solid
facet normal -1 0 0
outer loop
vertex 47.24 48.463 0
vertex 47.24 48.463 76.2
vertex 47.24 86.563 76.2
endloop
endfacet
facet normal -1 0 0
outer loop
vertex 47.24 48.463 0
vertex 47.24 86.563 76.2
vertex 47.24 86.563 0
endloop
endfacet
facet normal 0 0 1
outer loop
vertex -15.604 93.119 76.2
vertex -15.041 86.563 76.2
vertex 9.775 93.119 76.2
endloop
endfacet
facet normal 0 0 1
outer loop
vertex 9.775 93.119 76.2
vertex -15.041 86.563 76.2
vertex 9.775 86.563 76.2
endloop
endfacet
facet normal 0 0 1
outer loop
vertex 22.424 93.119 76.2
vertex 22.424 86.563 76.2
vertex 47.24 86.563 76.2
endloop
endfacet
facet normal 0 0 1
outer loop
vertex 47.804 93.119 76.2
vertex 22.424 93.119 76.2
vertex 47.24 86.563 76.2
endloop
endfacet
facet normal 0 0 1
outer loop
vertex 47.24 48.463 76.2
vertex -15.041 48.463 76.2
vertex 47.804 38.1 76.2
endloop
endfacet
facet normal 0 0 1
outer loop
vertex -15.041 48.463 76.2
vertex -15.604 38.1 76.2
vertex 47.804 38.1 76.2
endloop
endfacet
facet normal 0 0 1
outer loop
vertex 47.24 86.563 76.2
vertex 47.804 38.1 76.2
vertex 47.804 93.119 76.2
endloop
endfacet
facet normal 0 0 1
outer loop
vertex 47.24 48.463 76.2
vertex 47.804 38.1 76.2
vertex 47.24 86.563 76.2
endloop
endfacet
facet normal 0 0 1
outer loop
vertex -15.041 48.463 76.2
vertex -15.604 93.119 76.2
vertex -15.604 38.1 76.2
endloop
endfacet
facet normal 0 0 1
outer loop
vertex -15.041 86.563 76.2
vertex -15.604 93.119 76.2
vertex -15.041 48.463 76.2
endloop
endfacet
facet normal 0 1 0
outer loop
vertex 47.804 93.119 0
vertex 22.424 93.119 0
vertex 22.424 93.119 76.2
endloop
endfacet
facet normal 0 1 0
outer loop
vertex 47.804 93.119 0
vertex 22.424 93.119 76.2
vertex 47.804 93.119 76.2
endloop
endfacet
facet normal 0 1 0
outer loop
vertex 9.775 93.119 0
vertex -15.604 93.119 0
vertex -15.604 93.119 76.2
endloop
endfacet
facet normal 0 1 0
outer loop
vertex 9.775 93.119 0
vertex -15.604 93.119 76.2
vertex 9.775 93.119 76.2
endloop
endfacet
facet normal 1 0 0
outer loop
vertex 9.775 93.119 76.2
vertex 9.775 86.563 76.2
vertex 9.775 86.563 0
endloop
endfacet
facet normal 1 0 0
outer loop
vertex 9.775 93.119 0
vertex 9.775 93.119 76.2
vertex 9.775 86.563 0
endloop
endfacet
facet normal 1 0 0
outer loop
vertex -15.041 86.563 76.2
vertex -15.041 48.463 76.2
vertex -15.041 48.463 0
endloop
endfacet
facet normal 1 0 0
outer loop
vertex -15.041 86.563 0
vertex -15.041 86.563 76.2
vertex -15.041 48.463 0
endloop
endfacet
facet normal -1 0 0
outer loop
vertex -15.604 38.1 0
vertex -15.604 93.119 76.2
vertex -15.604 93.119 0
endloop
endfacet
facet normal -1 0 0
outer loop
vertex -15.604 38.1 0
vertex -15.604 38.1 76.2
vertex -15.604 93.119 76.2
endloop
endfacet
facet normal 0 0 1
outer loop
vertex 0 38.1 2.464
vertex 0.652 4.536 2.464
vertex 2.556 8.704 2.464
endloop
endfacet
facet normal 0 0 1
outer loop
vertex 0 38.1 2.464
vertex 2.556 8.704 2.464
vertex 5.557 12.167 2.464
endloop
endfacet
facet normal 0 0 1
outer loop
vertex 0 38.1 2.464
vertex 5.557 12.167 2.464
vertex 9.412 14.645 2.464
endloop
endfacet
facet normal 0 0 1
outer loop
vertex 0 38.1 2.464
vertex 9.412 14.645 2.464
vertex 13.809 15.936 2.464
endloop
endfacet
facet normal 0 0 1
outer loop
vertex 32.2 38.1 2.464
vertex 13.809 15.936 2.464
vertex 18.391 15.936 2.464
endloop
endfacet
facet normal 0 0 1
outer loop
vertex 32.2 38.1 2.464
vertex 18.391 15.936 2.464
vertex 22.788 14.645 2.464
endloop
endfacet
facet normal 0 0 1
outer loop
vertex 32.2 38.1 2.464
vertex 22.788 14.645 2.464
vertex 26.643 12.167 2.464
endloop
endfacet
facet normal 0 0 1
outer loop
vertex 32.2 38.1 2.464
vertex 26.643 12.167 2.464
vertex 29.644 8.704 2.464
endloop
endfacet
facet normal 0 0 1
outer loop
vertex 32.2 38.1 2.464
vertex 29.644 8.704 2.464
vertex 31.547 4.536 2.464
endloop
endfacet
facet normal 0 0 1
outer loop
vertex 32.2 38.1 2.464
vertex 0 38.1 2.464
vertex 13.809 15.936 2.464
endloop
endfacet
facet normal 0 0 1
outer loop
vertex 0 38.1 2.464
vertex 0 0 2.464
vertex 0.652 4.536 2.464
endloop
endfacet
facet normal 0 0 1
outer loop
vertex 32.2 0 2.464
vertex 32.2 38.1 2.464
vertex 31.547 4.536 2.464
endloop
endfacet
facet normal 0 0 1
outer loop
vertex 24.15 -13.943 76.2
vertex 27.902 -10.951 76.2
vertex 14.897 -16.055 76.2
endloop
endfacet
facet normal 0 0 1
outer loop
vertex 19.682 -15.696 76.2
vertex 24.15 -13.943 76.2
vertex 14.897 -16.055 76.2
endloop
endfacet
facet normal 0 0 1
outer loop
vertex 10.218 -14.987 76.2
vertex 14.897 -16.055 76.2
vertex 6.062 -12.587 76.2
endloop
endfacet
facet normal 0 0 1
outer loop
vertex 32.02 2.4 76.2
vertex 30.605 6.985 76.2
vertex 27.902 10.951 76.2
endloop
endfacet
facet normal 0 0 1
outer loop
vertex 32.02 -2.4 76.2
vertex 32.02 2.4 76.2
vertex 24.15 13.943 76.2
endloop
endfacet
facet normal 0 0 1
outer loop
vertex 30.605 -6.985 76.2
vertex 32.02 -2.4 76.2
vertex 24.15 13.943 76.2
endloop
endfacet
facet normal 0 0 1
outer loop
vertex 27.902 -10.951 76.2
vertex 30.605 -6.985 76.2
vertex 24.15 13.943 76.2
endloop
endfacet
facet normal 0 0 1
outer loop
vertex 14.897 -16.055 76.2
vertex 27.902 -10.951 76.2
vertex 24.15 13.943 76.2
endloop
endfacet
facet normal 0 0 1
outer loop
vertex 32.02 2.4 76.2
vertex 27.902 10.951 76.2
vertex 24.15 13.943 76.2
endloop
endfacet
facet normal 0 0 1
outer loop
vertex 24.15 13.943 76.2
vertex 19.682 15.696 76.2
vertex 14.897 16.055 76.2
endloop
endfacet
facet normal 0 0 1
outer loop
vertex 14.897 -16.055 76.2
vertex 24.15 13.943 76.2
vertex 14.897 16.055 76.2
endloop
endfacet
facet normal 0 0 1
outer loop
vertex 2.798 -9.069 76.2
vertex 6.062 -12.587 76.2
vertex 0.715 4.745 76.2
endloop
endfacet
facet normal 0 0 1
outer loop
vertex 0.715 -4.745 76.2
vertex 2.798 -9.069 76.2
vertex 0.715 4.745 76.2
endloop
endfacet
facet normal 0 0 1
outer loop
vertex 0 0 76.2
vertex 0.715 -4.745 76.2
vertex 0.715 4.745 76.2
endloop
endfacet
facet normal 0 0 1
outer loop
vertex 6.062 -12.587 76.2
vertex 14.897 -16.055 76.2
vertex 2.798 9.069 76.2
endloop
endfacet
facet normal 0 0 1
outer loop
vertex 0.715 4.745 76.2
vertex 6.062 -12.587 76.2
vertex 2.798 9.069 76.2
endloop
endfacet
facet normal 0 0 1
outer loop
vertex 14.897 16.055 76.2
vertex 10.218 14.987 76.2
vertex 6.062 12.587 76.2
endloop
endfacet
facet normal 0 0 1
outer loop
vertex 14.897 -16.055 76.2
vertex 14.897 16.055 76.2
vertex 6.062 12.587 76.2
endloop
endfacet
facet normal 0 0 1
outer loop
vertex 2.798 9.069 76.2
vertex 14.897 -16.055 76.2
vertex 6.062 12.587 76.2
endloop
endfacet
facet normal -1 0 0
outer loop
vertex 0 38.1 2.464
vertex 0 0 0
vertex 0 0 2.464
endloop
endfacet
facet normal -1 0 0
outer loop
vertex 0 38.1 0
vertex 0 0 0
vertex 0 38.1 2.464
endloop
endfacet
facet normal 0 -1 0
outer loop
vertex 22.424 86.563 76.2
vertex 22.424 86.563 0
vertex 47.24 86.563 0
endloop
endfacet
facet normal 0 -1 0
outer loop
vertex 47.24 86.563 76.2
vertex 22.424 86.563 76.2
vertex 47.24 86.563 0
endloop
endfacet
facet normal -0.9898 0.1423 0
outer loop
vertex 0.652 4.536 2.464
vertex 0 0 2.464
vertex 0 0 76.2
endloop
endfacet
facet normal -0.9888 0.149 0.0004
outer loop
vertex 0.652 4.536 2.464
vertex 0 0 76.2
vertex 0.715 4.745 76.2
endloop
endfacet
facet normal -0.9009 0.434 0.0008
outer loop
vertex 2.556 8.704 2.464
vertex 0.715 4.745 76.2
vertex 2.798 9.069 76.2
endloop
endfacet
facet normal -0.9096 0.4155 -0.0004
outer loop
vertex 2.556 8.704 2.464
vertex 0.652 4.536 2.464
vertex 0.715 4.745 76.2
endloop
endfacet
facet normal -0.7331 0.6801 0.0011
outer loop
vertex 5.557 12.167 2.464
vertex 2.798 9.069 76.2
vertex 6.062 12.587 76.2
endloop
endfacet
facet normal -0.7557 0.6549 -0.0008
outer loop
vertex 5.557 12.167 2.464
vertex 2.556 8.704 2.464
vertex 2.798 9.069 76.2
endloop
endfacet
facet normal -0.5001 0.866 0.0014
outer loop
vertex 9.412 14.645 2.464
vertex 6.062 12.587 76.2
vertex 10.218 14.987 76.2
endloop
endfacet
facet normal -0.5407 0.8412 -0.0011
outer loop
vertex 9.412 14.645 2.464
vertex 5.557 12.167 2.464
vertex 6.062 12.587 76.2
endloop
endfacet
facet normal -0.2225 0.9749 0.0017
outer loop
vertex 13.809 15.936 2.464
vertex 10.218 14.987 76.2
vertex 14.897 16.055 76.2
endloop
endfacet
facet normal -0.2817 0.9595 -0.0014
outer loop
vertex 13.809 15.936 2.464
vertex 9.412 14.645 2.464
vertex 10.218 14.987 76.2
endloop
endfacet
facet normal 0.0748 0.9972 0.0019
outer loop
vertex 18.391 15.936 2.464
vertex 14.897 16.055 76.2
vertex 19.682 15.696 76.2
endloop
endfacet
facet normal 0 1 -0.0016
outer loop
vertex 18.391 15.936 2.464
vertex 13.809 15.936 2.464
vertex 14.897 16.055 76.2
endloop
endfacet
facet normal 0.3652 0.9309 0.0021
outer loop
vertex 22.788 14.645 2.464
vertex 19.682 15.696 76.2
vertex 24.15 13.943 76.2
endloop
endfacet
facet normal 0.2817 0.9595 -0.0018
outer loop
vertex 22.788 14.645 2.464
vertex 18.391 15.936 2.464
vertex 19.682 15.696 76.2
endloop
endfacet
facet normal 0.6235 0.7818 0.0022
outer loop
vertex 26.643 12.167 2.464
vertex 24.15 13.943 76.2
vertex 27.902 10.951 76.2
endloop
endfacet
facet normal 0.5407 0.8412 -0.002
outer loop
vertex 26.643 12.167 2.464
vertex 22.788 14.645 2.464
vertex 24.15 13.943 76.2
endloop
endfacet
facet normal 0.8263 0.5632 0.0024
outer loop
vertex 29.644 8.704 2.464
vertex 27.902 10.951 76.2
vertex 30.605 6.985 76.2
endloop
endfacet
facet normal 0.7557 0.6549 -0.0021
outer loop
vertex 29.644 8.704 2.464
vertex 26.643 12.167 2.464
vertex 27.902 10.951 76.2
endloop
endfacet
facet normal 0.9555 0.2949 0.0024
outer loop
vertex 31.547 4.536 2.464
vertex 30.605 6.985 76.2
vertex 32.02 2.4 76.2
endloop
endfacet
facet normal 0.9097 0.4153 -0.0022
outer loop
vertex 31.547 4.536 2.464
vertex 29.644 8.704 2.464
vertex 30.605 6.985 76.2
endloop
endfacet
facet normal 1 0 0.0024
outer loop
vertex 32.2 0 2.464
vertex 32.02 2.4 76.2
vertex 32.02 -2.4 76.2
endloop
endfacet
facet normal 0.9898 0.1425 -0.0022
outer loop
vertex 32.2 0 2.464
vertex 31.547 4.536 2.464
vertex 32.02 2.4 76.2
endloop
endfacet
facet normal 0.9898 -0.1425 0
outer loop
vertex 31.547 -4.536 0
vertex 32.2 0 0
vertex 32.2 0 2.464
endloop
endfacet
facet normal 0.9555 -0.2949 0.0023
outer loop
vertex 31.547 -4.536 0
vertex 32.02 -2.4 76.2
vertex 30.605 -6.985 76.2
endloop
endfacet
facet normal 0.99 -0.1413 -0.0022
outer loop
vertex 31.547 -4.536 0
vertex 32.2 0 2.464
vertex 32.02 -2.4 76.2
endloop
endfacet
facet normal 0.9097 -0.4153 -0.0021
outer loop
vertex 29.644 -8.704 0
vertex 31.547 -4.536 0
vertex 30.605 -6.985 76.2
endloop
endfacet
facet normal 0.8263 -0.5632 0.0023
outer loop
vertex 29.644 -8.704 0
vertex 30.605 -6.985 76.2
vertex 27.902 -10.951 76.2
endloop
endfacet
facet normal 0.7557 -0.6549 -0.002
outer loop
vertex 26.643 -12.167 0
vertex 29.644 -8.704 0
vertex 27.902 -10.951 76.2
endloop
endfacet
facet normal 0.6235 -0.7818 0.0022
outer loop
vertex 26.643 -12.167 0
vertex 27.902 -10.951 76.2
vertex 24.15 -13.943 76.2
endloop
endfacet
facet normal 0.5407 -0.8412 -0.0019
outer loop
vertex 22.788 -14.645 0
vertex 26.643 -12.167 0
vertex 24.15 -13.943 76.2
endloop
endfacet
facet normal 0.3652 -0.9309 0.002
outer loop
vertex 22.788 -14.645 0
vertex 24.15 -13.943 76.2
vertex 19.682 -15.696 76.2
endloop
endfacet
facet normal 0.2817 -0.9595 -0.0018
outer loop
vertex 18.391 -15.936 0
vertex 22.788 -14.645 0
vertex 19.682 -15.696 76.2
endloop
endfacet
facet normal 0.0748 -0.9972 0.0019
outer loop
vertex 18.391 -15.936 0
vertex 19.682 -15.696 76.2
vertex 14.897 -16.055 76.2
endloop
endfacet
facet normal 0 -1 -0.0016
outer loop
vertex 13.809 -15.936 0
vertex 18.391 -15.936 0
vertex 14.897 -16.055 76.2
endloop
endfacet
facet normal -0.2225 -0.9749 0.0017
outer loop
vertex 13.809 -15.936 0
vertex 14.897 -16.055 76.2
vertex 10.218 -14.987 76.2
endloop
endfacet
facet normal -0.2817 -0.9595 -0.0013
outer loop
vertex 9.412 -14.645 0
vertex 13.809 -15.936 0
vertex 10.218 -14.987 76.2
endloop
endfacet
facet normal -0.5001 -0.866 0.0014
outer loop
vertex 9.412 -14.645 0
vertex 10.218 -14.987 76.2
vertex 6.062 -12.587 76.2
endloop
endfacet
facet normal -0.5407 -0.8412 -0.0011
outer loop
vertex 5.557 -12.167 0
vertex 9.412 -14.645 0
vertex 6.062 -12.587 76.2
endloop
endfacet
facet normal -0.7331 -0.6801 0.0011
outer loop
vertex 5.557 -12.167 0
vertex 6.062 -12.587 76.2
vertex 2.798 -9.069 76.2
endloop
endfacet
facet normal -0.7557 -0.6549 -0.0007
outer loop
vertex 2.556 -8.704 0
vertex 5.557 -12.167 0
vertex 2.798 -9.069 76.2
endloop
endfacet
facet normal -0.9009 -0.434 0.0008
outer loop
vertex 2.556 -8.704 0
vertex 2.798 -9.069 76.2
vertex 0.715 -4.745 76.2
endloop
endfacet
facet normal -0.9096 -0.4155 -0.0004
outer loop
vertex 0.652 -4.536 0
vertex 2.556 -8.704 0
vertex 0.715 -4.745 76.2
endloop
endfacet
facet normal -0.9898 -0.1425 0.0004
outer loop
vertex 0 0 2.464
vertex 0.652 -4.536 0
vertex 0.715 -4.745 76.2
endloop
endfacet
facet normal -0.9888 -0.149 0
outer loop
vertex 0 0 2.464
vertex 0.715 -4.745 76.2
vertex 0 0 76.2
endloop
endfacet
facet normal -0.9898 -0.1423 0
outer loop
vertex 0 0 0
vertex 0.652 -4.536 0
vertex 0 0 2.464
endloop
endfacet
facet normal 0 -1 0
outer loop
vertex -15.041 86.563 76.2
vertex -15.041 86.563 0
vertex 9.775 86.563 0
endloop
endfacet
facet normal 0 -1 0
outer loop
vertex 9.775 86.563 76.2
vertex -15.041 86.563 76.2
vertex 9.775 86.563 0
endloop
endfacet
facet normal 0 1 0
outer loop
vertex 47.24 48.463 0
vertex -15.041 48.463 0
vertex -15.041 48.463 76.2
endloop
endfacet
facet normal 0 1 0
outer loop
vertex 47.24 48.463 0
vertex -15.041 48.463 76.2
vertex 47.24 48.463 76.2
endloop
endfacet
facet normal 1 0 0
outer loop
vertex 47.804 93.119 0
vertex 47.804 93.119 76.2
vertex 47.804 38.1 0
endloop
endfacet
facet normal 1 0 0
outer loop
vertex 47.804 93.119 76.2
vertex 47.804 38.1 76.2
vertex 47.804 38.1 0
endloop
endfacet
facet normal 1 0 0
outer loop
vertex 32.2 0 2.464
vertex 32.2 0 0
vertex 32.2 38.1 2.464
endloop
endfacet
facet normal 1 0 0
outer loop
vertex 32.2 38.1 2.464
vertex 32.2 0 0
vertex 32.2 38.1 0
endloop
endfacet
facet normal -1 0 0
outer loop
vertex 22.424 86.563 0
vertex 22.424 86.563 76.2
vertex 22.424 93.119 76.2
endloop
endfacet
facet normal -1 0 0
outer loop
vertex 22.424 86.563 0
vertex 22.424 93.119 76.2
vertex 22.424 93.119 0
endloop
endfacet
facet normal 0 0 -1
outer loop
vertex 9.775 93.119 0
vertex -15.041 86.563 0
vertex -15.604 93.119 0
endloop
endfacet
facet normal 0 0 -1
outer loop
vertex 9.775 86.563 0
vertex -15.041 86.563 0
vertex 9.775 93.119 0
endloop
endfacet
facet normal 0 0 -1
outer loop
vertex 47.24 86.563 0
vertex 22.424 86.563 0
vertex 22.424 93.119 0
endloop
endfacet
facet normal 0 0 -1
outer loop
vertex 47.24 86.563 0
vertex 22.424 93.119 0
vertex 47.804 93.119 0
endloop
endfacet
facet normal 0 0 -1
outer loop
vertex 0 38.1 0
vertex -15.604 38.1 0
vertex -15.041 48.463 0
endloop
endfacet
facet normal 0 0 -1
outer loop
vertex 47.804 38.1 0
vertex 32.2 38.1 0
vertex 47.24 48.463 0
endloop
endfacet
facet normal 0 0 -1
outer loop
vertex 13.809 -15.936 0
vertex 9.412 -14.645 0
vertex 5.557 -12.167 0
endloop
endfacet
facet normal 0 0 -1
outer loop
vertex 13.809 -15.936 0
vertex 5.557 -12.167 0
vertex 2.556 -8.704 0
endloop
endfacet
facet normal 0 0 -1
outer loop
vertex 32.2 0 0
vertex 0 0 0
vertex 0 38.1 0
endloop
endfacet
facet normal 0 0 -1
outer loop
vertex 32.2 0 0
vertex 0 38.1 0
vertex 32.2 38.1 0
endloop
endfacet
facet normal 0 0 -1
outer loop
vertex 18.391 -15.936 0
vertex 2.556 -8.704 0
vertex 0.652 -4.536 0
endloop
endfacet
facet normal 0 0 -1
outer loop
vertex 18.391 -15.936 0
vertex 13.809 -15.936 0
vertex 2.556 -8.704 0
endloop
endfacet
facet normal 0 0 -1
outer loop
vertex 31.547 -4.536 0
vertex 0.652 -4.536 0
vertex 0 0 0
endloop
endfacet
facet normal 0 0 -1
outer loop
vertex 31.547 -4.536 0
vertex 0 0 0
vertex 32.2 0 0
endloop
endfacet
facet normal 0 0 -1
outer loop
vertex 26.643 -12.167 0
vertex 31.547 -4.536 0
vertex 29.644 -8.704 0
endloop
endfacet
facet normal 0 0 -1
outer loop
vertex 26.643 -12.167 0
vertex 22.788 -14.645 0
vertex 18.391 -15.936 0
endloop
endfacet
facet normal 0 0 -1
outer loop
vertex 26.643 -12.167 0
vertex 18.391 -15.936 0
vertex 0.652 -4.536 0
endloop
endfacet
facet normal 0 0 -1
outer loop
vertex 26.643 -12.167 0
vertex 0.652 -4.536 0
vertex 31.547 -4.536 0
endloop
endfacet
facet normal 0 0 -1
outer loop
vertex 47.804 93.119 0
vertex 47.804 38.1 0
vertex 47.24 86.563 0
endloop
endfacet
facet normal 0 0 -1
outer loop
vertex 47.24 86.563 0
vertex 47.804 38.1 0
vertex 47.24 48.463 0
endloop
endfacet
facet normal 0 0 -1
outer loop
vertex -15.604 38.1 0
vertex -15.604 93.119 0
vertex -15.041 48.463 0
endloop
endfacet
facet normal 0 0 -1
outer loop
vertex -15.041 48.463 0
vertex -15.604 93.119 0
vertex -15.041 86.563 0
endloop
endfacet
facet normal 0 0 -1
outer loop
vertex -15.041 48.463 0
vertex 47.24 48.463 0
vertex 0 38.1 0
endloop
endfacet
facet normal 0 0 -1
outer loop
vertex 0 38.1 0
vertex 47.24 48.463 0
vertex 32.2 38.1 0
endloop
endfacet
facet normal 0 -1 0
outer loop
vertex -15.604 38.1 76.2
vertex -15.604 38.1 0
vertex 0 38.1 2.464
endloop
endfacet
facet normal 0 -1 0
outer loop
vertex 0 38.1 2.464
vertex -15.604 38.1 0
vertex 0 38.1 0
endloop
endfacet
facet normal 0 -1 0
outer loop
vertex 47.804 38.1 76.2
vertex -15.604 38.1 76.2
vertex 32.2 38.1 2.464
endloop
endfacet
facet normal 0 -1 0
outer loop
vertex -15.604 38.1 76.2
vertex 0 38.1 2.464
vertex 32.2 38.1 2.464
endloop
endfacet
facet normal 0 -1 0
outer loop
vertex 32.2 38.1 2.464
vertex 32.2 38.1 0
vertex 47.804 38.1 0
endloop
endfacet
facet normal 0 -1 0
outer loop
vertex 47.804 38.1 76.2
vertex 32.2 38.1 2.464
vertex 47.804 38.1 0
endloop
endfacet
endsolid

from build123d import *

# Parameters (mm, degrees)
SKETCH2_W            = 32.19958
SKETCH2_H            = 38.1
BOSS_EXTRUDE3_DEPTH  = 2.4638
SKETCH4_R            = 16.09979
BOSS_EXTRUDE4_DEPTH  = 76.2
SKETCH5_W            = 63.40856
SKETCH5_H            = 76.2
BOSS_EXTRUDE5_DEPTH  = 10.3632
SKETCH6_W            = 0.56388
SKETCH6_H            = 76.2
BOSS_EXTRUDE6_DEPTH  = 38.1
SKETCH8_W            = 0.56388
SKETCH8_H            = 76.2
BOSS_EXTRUDE7_DEPTH  = 38.1
SKETCH10_W           = 25.37968
SKETCH10_H           = 76.2
BOSS_EXTRUDE8_DEPTH  = 6.55574
SKETCH12_W           = 25.37968
SKETCH12_H           = 76.2
BOSS_EXTRUDE10_DEPTH = 6.55574


with BuildPart() as part:
    # Sketch2 → Boss-Extrude3 (new body)
    with BuildSketch(Plane.XY):
        with Locations((16.09979, 19.05)):
            Rectangle(SKETCH2_W, SKETCH2_H)
    extrude(amount=BOSS_EXTRUDE3_DEPTH)

    # Sketch4 → Boss-Extrude4 (add)
    with BuildSketch(Plane(origin=(0, 0, 0), x_dir=(-1, 0, 0), z_dir=(0, 0, -1))):
        with Locations((-16.09979, 0)):
            Circle(SKETCH4_R)
    extrude(amount=-BOSS_EXTRUDE4_DEPTH)

    # Sketch5 → Boss-Extrude5 (add)
    with BuildSketch(Plane(origin=(0, 38.1, 0), x_dir=(1, 0, 0), z_dir=(0, 1, 0))):
        with Locations((16.09979, -38.1)):
            Rectangle(SKETCH5_W, SKETCH5_H)
    extrude(amount=BOSS_EXTRUDE5_DEPTH)

    # Sketch6 → Boss-Extrude6 (add)
    with BuildSketch(Plane(origin=(0, 48.4632, 0), x_dir=(1, 0, 0), z_dir=(0, 1, 0))):
        with Locations((47.52213, -38.1)):
            Rectangle(SKETCH6_W, SKETCH6_H)
    extrude(amount=BOSS_EXTRUDE6_DEPTH)

    # Sketch8 → Boss-Extrude7 (add)
    with BuildSketch(Plane(origin=(0, 48.4632, 0), x_dir=(1, 0, 0), z_dir=(0, 1, 0))):
        with Locations((-15.32255, -38.1)):
            Rectangle(SKETCH8_W, SKETCH8_H)
    extrude(amount=BOSS_EXTRUDE7_DEPTH)

    # Sketch10 → Boss-Extrude8 (add)
    with BuildSketch(Plane(origin=(0, 86.5632, 0), x_dir=(1, 0, 0), z_dir=(0, 1, 0))):
        with Locations((-2.91465, -38.1)):
            Rectangle(SKETCH10_W, SKETCH10_H)
    extrude(amount=BOSS_EXTRUDE8_DEPTH)

    # Sketch12 → Boss-Extrude10 (add)
    with BuildSketch(Plane(origin=(0, 86.5632, 0), x_dir=(1, 0, 0), z_dir=(0, 1, 0))):
        with Locations((35.11423, -38.1)):
            Rectangle(SKETCH12_W, SKETCH12_H)
    extrude(amount=BOSS_EXTRUDE10_DEPTH)


solid = part.part
